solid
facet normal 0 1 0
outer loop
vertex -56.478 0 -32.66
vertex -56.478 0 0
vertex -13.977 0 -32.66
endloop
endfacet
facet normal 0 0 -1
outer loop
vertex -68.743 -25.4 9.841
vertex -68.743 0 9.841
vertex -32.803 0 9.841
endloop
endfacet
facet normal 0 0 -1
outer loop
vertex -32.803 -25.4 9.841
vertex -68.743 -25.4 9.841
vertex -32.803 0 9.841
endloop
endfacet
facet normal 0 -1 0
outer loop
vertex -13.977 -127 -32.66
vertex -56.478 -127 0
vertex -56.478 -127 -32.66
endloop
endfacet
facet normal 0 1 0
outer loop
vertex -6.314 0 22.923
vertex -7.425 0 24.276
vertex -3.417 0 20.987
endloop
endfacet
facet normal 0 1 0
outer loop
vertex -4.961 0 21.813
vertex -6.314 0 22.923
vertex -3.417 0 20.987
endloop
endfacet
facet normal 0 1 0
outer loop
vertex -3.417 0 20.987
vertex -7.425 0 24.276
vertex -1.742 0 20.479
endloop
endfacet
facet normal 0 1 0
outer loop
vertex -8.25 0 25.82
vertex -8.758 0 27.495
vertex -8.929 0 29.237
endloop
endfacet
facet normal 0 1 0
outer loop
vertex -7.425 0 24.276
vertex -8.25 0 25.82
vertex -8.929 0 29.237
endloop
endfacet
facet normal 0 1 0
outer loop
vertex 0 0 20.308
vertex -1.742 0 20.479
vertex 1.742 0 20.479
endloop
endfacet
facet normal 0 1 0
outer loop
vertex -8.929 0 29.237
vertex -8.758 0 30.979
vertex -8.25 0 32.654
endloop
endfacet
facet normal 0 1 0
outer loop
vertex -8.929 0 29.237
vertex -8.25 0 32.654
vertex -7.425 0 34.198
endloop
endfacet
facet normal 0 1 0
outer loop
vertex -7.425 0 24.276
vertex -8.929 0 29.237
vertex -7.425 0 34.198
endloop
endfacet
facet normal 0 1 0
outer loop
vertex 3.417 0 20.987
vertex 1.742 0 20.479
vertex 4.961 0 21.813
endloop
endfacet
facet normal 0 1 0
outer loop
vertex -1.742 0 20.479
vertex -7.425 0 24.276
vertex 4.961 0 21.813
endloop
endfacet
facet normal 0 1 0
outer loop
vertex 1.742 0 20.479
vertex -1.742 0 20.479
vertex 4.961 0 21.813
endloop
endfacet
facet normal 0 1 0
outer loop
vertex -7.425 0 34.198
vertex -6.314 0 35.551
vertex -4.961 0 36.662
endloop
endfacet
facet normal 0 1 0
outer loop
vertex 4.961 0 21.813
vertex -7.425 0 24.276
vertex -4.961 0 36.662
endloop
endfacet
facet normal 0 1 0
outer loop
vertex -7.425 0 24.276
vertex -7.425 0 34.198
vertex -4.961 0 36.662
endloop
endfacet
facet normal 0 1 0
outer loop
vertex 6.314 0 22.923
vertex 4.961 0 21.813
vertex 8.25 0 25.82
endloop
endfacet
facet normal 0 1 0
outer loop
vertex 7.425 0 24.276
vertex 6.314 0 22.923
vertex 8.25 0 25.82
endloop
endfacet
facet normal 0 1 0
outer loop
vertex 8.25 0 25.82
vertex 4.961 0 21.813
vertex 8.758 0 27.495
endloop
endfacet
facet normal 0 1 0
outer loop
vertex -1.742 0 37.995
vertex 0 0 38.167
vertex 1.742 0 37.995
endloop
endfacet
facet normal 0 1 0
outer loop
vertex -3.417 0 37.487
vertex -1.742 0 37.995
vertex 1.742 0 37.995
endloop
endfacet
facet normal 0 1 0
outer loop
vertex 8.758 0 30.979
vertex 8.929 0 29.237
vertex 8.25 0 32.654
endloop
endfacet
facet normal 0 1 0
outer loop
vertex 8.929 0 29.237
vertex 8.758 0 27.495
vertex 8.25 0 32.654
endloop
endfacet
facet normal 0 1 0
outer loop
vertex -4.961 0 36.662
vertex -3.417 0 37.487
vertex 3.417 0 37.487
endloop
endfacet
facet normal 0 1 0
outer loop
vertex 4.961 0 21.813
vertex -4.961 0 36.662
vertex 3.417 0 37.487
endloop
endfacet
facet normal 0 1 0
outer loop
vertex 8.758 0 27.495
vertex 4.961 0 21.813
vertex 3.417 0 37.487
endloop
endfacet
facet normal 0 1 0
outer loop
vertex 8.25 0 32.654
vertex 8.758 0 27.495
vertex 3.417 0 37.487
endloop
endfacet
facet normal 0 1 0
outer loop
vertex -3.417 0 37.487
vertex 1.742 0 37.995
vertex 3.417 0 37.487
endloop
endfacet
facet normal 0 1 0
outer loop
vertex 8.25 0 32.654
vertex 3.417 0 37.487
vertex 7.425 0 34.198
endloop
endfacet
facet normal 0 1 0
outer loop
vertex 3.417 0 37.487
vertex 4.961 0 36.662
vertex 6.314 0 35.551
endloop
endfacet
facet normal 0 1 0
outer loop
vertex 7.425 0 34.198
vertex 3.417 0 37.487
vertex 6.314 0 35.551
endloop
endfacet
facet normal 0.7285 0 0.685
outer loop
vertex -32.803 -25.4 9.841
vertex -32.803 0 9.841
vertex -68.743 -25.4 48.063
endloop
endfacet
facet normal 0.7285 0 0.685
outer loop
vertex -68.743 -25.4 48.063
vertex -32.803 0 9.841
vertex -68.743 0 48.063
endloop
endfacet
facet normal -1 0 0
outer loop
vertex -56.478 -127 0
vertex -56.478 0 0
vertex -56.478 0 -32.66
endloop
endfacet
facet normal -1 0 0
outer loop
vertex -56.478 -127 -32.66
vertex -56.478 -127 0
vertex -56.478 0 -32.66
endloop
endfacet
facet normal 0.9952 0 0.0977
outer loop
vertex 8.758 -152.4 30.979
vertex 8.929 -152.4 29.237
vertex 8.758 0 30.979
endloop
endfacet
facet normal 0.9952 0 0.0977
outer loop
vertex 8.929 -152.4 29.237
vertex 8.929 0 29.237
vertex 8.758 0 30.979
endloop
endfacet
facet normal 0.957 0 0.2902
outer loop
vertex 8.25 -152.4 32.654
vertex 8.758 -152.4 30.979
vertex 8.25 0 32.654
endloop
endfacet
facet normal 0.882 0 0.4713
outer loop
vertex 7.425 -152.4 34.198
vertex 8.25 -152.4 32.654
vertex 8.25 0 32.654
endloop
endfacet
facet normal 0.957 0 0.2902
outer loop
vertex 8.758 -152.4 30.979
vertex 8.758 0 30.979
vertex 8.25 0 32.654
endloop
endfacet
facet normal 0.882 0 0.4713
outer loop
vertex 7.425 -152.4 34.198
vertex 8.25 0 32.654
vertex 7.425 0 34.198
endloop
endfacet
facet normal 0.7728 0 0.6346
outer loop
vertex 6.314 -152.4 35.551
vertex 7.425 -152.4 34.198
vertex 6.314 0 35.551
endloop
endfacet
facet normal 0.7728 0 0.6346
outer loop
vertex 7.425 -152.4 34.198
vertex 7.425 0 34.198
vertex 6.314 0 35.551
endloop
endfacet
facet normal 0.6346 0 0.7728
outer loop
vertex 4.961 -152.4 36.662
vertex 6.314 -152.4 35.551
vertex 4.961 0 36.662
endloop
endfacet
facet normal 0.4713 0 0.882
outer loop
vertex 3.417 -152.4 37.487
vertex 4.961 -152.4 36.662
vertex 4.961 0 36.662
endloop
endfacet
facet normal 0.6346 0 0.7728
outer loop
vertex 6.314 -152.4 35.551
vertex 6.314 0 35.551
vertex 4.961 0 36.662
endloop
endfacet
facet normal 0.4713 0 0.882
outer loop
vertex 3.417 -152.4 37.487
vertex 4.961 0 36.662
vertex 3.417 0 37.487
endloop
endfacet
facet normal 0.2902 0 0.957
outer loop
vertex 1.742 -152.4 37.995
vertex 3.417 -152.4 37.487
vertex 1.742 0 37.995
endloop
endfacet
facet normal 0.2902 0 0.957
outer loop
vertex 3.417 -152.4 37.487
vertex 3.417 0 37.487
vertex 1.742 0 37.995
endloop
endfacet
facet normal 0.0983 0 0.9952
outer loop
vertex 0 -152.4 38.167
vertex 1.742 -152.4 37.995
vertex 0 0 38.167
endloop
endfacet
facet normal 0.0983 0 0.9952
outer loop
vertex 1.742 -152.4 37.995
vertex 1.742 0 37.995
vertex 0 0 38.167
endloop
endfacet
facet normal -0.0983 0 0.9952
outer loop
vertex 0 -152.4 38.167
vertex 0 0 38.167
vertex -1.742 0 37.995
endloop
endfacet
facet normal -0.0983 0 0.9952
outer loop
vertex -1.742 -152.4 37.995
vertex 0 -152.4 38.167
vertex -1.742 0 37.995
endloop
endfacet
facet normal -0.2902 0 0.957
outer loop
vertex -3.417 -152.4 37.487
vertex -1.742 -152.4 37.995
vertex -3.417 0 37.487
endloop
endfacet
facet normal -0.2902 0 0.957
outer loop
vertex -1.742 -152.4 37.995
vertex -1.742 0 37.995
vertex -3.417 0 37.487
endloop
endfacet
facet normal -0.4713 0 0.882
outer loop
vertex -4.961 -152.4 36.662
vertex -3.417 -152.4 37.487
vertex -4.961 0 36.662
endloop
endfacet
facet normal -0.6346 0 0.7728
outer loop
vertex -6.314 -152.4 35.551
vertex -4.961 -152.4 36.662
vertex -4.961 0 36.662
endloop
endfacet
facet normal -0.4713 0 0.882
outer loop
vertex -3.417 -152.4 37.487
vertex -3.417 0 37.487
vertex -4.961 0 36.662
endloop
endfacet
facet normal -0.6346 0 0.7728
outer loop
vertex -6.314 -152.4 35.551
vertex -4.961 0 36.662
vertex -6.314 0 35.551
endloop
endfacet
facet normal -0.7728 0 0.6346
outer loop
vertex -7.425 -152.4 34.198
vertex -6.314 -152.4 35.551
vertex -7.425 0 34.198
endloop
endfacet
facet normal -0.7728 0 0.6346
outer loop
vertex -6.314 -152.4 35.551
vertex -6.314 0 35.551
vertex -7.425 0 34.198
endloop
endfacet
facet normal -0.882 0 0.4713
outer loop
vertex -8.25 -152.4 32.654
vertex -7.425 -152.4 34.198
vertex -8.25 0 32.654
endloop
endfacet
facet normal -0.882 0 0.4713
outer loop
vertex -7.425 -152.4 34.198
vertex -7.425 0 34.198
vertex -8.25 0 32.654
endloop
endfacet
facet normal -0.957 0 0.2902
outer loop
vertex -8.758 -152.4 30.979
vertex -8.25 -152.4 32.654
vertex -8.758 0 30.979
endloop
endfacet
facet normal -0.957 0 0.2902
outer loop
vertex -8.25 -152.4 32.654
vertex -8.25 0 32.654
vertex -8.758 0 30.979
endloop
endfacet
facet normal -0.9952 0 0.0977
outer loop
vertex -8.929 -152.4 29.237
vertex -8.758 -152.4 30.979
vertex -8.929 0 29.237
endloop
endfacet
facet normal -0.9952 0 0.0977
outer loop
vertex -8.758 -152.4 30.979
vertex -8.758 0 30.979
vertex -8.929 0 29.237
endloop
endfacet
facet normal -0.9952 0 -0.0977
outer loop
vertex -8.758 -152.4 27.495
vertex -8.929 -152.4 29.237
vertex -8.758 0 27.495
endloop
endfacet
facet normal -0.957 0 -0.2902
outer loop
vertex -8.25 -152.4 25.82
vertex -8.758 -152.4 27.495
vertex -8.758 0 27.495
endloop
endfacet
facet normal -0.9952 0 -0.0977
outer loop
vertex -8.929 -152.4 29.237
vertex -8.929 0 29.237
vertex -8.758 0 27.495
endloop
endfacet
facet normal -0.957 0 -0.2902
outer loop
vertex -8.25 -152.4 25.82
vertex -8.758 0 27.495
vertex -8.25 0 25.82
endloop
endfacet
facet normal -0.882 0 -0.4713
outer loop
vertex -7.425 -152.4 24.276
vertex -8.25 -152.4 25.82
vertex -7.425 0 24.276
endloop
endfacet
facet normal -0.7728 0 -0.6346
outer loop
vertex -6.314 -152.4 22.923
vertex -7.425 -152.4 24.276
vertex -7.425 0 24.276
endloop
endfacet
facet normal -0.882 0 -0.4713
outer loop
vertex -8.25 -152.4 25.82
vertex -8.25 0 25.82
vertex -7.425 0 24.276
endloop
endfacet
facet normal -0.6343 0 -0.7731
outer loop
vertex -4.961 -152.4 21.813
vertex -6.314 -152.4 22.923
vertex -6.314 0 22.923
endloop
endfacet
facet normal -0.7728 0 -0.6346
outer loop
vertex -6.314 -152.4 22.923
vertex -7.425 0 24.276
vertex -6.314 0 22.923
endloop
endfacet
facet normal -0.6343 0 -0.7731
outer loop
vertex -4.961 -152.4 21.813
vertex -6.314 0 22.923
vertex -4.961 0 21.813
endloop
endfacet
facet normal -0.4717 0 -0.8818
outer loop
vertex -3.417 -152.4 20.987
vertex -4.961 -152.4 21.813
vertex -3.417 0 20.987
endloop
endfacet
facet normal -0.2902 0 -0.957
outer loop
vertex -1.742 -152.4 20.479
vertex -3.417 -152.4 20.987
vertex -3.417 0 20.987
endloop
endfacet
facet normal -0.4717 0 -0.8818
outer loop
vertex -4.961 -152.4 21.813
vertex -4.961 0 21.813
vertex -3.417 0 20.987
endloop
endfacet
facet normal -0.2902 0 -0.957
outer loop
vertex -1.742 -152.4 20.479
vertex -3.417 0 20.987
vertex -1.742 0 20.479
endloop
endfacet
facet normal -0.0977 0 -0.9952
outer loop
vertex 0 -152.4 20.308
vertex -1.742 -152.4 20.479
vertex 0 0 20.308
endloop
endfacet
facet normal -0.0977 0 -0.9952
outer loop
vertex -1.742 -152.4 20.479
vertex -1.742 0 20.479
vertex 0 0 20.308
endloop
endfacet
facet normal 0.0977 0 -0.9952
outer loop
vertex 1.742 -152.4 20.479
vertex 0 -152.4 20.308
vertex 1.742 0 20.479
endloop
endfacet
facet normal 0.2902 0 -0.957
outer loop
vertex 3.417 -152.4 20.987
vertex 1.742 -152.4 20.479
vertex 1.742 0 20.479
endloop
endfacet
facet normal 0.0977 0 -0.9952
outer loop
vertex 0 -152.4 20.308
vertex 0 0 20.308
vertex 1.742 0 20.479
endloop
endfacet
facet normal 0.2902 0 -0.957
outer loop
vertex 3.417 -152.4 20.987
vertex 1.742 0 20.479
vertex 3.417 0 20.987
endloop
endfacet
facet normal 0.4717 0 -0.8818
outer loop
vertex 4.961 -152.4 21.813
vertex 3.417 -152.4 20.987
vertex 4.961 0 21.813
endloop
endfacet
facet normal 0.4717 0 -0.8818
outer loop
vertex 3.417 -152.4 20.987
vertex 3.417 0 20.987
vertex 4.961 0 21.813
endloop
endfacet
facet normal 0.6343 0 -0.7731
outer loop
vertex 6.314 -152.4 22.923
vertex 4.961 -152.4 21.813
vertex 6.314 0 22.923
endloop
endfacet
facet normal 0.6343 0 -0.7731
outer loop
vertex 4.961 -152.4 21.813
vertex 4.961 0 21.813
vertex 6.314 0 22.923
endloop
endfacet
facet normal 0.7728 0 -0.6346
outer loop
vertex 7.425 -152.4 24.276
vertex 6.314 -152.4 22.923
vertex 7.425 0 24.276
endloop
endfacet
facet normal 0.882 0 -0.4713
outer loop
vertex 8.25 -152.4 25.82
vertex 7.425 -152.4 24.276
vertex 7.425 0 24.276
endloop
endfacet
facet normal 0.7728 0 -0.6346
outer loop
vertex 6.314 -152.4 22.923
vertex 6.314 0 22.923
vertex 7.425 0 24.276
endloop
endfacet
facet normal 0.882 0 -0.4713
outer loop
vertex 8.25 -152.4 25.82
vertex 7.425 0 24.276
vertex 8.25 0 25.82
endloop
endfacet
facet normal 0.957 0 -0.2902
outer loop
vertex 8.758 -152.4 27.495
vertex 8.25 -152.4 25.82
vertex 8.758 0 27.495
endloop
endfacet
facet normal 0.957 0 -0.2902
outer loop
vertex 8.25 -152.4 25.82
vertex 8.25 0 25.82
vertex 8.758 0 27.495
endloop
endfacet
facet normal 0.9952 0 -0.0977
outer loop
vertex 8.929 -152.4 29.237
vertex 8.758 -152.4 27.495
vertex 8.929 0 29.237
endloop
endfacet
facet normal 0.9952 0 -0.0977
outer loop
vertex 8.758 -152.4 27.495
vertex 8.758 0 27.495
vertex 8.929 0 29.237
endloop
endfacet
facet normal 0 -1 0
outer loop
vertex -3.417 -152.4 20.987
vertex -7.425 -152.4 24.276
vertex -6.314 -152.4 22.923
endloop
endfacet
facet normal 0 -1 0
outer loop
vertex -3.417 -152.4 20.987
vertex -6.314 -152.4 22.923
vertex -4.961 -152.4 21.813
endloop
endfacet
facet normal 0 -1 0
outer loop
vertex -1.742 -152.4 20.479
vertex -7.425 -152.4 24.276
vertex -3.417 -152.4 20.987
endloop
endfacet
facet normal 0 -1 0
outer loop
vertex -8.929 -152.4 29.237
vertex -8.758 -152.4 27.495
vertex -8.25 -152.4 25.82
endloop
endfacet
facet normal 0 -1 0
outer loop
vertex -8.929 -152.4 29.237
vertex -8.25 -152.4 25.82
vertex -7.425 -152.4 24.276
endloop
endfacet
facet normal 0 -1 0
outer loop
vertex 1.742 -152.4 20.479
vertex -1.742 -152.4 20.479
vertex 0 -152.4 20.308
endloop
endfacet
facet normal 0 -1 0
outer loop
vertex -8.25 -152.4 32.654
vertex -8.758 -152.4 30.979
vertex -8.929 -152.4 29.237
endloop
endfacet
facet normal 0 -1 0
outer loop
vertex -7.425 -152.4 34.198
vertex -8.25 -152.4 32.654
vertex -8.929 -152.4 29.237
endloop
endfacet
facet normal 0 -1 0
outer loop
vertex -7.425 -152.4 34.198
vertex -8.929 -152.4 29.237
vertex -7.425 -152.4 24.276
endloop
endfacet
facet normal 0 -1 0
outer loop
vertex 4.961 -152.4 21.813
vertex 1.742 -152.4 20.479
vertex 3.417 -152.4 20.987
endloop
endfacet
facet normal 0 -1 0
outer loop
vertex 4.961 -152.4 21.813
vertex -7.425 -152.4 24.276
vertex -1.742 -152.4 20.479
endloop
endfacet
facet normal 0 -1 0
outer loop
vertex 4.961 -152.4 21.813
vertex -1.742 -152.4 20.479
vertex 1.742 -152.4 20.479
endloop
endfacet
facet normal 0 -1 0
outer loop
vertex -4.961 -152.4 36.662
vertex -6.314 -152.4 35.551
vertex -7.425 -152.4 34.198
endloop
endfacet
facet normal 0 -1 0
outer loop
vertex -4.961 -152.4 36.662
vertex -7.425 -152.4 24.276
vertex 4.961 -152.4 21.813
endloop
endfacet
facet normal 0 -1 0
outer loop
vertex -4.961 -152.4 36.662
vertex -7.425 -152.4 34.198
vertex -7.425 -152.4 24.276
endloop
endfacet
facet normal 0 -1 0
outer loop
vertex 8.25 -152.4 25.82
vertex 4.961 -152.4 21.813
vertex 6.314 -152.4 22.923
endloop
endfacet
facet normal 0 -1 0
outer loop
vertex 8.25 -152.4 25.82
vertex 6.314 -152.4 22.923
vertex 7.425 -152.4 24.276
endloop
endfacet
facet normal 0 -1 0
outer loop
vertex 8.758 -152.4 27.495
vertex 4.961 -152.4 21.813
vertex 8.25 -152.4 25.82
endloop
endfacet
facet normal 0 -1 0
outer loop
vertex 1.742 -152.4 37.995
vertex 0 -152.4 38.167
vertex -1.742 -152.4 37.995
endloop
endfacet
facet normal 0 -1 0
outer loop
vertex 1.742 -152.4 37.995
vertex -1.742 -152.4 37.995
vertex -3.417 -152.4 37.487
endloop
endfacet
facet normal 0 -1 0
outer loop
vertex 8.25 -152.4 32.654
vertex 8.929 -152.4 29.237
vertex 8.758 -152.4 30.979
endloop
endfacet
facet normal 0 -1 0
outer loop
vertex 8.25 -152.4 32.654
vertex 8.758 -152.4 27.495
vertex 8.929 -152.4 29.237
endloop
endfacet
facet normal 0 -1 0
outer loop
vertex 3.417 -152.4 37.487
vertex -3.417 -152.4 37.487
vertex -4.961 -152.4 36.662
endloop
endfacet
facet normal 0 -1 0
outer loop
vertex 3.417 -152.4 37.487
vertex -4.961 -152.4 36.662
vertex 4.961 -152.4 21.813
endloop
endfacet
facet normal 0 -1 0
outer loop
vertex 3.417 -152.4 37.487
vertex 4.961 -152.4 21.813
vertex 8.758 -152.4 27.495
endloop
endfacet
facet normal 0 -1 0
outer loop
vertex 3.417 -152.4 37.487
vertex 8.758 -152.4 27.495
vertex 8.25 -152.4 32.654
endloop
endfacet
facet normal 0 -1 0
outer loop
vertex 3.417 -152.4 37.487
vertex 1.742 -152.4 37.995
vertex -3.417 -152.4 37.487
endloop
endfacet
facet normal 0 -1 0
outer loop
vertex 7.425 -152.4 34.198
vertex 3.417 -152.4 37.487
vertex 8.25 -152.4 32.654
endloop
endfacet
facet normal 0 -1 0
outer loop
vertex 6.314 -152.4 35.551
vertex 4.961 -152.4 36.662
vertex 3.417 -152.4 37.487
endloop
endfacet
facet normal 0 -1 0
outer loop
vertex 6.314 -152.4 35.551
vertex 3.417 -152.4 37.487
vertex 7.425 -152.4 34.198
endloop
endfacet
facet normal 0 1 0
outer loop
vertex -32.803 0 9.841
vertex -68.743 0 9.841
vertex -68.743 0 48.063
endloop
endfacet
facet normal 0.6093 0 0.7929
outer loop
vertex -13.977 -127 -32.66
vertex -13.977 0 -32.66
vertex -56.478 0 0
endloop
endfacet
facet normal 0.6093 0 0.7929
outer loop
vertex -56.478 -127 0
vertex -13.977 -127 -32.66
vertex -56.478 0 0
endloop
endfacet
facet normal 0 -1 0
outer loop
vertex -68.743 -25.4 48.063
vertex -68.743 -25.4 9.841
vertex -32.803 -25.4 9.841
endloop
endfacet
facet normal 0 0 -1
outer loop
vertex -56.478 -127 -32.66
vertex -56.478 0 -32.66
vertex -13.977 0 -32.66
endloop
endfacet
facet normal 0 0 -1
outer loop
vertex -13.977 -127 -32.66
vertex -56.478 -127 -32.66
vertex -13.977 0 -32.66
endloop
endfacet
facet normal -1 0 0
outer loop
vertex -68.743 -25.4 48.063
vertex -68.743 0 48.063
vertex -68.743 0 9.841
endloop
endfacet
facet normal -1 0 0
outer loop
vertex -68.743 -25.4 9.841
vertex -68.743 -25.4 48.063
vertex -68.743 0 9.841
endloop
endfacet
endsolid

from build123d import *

# Parameters (mm, degrees)
F1_R      = 8.929443
F2_DEPTH  = 25.4
F2_FACE_R = 8.929443
F3_DEPTH  = 127
F5_DEPTH  = 127
F7_DEPTH  = 25.4


with BuildPart() as f2:
    # F1 (on face) → F2 (new body)
    with BuildSketch(Plane.XZ):
        with Locations((0, 29.237164)):
            Circle(F1_R)
    extrude(amount=F2_DEPTH)

    # F2_face (on face) → F3 (join)
    with BuildSketch(Plane(origin=(0, -25.4, 29.237164), x_dir=(1, 0, 0), z_dir=(0, -1, 0))):
        Circle(F2_FACE_R)
    extrude(amount=F3_DEPTH)


with BuildPart() as f5:
    # F4 (on Front) → F5 (new body)
    with BuildSketch(Plane.XZ):
        Polygon((-13.976792, -32.660052), (-56.477647, 0), (-56.477647, -32.660052), align=None)
    extrude(amount=F5_DEPTH)


with BuildPart() as f7:
    # F6 (on Front) → F7 (new body)
    with BuildSketch(Plane.XZ):
        Polygon((-32.802675, 9.840802), (-68.742998, 48.063047), (-68.742998, 9.840802), align=None)
    extrude(amount=F7_DEPTH)


solid = Compound([f2.part, f5.part, f7.part])
